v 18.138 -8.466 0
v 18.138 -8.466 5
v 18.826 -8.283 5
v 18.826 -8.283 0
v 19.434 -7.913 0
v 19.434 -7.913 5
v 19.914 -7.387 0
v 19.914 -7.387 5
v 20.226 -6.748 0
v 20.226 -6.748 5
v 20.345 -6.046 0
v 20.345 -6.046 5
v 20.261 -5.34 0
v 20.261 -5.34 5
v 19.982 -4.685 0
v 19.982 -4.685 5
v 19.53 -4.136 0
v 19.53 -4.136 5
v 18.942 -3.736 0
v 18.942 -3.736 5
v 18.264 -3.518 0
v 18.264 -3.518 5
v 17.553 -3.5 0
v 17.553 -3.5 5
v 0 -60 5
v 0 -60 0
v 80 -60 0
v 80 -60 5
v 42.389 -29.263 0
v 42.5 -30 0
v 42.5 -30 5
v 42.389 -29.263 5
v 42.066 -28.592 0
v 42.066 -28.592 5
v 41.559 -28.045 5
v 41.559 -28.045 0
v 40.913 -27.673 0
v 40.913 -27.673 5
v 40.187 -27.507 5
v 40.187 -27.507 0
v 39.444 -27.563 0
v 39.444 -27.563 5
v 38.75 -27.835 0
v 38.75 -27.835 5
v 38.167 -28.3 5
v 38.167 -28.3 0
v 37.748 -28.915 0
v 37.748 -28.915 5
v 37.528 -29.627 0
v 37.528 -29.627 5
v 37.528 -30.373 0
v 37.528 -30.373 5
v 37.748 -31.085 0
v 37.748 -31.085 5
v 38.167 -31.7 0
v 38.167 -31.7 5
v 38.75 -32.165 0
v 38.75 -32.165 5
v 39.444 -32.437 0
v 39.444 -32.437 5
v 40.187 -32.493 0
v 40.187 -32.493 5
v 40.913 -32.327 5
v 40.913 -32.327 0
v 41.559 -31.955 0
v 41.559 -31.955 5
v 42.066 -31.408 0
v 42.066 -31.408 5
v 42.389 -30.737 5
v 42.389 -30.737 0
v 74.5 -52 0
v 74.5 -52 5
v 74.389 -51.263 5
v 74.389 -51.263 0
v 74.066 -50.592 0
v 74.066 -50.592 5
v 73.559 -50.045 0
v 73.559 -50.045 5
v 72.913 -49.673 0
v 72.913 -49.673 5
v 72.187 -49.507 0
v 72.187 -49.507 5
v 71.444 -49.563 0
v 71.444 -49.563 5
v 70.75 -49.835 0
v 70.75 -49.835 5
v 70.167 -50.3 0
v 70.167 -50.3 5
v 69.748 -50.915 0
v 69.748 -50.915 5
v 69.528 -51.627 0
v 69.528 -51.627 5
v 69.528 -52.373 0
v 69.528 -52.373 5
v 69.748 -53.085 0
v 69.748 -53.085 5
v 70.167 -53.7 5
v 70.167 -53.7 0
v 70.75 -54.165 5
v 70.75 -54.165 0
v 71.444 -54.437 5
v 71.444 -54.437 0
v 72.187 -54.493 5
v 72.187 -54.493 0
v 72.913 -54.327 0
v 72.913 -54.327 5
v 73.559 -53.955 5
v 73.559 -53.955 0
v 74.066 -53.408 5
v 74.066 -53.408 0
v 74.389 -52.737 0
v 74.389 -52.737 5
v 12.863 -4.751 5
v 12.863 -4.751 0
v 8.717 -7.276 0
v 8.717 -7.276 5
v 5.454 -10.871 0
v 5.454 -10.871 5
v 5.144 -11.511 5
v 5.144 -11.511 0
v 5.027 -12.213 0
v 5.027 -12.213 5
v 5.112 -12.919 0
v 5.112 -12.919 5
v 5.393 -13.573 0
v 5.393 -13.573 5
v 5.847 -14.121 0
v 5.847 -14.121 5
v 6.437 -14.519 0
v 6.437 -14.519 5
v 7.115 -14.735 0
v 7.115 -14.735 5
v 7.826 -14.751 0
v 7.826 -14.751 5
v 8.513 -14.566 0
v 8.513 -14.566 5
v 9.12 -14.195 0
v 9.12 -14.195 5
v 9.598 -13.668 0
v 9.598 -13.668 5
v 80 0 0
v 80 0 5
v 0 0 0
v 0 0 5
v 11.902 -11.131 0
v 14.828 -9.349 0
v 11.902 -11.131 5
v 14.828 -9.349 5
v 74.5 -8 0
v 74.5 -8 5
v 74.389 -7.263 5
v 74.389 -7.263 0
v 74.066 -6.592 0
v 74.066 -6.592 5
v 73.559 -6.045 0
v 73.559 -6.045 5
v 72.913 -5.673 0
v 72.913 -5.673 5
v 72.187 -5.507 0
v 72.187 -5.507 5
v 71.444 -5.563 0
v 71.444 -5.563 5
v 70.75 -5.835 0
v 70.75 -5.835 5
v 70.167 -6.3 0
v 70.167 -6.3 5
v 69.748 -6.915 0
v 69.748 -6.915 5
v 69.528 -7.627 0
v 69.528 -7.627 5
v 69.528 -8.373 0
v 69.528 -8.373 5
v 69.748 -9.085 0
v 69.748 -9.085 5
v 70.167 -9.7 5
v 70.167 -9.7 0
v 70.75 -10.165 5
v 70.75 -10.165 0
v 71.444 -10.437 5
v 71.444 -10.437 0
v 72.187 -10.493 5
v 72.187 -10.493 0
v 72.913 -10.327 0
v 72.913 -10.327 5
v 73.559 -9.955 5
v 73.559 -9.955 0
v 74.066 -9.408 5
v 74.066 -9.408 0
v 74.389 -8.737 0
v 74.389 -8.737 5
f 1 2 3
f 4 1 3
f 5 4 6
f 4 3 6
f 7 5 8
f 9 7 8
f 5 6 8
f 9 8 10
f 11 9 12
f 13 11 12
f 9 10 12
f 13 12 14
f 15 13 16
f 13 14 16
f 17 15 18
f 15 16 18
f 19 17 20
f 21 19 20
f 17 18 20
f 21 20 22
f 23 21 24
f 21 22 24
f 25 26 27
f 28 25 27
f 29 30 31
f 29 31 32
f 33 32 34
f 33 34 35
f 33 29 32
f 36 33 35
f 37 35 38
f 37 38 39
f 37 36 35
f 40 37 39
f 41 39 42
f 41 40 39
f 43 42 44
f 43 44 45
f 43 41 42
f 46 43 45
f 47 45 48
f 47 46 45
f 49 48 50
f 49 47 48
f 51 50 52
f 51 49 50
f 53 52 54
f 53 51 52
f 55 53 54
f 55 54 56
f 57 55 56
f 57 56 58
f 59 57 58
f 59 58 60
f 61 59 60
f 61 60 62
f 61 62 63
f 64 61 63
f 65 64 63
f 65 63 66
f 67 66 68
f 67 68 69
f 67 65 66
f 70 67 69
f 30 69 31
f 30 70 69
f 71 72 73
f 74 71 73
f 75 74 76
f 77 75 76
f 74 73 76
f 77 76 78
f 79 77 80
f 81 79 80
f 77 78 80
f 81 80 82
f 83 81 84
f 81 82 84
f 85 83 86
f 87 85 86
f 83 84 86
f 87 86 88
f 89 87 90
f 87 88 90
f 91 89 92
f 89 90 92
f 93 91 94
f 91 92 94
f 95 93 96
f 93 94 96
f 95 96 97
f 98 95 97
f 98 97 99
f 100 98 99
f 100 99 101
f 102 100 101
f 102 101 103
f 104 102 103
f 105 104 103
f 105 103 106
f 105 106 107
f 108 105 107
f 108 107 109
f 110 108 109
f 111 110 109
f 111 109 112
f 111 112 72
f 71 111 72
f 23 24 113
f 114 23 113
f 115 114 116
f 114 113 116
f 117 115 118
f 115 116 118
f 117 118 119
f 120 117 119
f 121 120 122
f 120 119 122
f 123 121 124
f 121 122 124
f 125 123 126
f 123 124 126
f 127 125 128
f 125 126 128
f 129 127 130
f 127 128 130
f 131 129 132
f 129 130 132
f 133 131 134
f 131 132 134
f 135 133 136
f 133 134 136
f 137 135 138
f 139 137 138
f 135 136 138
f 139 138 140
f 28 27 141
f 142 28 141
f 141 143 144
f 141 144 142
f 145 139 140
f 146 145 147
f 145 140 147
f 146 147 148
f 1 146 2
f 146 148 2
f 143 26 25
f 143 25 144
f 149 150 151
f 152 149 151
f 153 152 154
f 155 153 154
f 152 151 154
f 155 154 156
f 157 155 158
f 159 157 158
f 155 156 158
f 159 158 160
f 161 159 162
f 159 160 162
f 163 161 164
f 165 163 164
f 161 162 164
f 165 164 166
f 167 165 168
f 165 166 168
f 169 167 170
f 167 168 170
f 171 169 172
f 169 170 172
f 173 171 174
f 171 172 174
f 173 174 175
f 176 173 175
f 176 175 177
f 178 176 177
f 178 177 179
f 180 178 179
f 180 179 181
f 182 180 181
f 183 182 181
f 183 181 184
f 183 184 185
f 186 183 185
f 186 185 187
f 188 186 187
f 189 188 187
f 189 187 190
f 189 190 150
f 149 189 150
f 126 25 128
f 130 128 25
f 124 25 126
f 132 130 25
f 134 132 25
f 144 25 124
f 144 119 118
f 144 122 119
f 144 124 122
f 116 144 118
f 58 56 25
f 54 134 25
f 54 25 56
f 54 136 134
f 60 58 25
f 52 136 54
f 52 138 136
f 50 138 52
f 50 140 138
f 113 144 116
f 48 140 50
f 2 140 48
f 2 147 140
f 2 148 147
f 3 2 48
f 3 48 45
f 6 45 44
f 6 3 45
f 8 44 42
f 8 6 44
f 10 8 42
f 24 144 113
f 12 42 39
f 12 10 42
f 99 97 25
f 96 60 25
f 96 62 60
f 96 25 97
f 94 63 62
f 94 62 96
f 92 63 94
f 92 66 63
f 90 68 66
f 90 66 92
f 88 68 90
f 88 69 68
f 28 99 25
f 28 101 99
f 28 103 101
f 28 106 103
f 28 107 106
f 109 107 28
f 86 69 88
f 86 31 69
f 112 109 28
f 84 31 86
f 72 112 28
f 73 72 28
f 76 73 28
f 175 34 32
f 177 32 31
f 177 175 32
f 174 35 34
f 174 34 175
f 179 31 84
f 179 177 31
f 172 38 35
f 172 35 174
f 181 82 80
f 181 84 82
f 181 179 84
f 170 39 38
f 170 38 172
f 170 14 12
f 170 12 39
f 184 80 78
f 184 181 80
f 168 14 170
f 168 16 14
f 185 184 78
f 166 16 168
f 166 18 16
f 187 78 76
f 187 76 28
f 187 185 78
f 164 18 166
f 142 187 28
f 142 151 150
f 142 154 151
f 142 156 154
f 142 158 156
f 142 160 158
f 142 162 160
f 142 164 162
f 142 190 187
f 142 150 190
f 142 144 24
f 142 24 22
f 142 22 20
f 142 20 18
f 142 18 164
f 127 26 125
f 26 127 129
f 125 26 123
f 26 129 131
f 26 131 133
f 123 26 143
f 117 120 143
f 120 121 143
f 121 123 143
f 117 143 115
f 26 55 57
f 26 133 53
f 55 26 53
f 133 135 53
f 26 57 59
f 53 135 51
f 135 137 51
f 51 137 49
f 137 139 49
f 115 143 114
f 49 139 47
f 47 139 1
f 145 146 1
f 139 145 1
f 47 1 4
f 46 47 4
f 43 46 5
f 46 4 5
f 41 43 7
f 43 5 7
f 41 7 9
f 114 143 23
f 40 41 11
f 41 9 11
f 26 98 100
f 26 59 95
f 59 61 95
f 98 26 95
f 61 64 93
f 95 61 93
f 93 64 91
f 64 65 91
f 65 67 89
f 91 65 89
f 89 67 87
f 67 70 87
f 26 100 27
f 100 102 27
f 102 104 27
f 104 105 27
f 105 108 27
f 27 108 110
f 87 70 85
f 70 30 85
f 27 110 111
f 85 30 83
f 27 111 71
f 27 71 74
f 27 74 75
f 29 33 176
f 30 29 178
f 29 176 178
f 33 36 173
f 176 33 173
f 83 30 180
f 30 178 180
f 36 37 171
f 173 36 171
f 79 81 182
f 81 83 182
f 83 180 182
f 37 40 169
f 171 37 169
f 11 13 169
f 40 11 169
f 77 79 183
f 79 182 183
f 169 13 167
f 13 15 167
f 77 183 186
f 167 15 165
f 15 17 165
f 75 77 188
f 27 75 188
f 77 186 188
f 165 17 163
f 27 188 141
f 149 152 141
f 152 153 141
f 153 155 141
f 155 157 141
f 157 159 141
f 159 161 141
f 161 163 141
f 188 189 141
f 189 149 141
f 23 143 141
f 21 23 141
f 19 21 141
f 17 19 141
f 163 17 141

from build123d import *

# Parameters (mm, degrees)
SKETCH1_W           = 80
SKETCH1_H           = 60
SKETCH1_R           = 2.5
BOSS_EXTRUDE1_DEPTH = 5
SKETCH2_R           = 2.5
CUT_EXTRUDE1_DEPTH  = 6


with BuildPart() as part:
    # Sketch1 → Boss-Extrude1 (new body)
    with BuildSketch(Plane.XY):
        with Locations((40, -30)):
            Rectangle(SKETCH1_W, SKETCH1_H)
        with Locations((40, -30)):
            Circle(SKETCH1_R, mode=Mode.SUBTRACT)
    extrude(amount=BOSS_EXTRUDE1_DEPTH)

    # Sketch2 → Cut-Extrude1 (cut, through all)
    with BuildSketch(Plane.XY.offset(5)):
        with Locations((72, -52)):
            Circle(SKETCH2_R)
        with Locations((72, -8)):
            Circle(SKETCH2_R)
        with BuildLine():
            ThreePointArc((17.552814057, -3.5), (10.699313896, -5.865002188), (5.454493121, -10.87055459))
            ThreePointArc((5.454493121, -10.87055459), (6.127589233, -14.341425031), (9.598459675, -13.66832892))
            ThreePointArc((9.598459675, -13.66832892), (13.300686104, -10.134997812), (18.138450924, -8.465584503))
            ThreePointArc((18.138450924, -8.465584503), (20.328424742, -5.689973818), (17.552814057, -3.5))
        make_face()
    extrude(amount=-CUT_EXTRUDE1_DEPTH, mode=Mode.SUBTRACT)


solid = part.part
